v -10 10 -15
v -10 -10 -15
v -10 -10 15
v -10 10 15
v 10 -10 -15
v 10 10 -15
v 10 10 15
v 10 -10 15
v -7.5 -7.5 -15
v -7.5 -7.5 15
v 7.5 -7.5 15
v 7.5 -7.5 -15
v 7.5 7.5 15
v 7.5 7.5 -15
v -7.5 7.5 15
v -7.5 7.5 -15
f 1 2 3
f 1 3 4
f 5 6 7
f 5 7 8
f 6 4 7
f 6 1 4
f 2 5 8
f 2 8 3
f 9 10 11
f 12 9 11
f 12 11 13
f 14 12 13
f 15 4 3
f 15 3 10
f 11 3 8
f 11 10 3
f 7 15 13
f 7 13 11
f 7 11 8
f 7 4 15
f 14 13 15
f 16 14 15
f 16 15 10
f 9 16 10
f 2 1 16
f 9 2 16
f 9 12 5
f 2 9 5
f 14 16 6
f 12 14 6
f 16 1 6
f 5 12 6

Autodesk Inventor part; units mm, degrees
ref_plane "YZ Plane" through (0, 0, 0) normal (1, 0, 0) x (0, 1, 0)
ref_plane "XZ Plane" through (0, 0, 0) normal (0, 1, 0) x (-1, 0, 0)
ref_plane "XY Plane" through (0, 0, 0) normal (0, 0, 1) x (1, 0, 0)
sketch "Esboço1" plane through (0, 0, 0) normal (0, 0, 1) x (1, 0, 0)
  line L0 (-10, 10) -> (10, 10)
  line L1 (10, 10) -> (10, -10)
  line L2 (10, -10) -> (-10, -10)
  line L3 (-10, -10) -> (-10, 10)
  line L4 (-10, 10) -> (10, -10) construction
  line L5 (10, 10) -> (-10, -10) construction
  line L6 (-7.5, -7.5) -> (7.5, -7.5)
  line L7 (7.5, -7.5) -> (7.5, 7.5)
  line L8 (7.5, 7.5) -> (-7.5, 7.5)
  line L9 (-7.5, 7.5) -> (-7.5, -7.5)
  line L10 (-7.5, -7.5) -> (7.5, 7.5) construction
  line L11 (7.5, -7.5) -> (-7.5, 7.5) construction
  point P0 (0, 0)
  point P1 (0, 0)
  point P2 (0, 0)
  dimension "d0" = 20
  dimension "d1" = 10
  dimension "d2" = 15
  dimension "d3" = 15
extrude "Extrusão1" add sketch "Esboço1" along normal mid plane 30
sketch "Esboço2" plane through (0, 0, 15) normal (0, 0, 1) x (1, 0, 0)
  line L0 (10, -10) -> (10, 10) projected
  point P0 (0, 0)
  point P1 (9, 0)
sketch "Esboço10" plane through (0, 0, 0) normal (1, 0, 0) x (0, 1, 0)
  point P0 (0, 0)
sketch "Esboço12" plane through (0, 0, 0) normal (1, 0, 0) x (0, 1, 0)
  line L0 (9, 14) -> (7, 14)
  line L1 (7, 14) -> (7, 12)
  line L2 (7, 12) -> (9, 12)
  line L3 (9, 12) -> (9, 14)
  line L4 (9, 14) -> (7, 12) construction
  line L5 (7, 14) -> (9, 12) construction
  point P0 (0, 0)
  point P1 (8, 13)
properties part number "Peça6_cube"
